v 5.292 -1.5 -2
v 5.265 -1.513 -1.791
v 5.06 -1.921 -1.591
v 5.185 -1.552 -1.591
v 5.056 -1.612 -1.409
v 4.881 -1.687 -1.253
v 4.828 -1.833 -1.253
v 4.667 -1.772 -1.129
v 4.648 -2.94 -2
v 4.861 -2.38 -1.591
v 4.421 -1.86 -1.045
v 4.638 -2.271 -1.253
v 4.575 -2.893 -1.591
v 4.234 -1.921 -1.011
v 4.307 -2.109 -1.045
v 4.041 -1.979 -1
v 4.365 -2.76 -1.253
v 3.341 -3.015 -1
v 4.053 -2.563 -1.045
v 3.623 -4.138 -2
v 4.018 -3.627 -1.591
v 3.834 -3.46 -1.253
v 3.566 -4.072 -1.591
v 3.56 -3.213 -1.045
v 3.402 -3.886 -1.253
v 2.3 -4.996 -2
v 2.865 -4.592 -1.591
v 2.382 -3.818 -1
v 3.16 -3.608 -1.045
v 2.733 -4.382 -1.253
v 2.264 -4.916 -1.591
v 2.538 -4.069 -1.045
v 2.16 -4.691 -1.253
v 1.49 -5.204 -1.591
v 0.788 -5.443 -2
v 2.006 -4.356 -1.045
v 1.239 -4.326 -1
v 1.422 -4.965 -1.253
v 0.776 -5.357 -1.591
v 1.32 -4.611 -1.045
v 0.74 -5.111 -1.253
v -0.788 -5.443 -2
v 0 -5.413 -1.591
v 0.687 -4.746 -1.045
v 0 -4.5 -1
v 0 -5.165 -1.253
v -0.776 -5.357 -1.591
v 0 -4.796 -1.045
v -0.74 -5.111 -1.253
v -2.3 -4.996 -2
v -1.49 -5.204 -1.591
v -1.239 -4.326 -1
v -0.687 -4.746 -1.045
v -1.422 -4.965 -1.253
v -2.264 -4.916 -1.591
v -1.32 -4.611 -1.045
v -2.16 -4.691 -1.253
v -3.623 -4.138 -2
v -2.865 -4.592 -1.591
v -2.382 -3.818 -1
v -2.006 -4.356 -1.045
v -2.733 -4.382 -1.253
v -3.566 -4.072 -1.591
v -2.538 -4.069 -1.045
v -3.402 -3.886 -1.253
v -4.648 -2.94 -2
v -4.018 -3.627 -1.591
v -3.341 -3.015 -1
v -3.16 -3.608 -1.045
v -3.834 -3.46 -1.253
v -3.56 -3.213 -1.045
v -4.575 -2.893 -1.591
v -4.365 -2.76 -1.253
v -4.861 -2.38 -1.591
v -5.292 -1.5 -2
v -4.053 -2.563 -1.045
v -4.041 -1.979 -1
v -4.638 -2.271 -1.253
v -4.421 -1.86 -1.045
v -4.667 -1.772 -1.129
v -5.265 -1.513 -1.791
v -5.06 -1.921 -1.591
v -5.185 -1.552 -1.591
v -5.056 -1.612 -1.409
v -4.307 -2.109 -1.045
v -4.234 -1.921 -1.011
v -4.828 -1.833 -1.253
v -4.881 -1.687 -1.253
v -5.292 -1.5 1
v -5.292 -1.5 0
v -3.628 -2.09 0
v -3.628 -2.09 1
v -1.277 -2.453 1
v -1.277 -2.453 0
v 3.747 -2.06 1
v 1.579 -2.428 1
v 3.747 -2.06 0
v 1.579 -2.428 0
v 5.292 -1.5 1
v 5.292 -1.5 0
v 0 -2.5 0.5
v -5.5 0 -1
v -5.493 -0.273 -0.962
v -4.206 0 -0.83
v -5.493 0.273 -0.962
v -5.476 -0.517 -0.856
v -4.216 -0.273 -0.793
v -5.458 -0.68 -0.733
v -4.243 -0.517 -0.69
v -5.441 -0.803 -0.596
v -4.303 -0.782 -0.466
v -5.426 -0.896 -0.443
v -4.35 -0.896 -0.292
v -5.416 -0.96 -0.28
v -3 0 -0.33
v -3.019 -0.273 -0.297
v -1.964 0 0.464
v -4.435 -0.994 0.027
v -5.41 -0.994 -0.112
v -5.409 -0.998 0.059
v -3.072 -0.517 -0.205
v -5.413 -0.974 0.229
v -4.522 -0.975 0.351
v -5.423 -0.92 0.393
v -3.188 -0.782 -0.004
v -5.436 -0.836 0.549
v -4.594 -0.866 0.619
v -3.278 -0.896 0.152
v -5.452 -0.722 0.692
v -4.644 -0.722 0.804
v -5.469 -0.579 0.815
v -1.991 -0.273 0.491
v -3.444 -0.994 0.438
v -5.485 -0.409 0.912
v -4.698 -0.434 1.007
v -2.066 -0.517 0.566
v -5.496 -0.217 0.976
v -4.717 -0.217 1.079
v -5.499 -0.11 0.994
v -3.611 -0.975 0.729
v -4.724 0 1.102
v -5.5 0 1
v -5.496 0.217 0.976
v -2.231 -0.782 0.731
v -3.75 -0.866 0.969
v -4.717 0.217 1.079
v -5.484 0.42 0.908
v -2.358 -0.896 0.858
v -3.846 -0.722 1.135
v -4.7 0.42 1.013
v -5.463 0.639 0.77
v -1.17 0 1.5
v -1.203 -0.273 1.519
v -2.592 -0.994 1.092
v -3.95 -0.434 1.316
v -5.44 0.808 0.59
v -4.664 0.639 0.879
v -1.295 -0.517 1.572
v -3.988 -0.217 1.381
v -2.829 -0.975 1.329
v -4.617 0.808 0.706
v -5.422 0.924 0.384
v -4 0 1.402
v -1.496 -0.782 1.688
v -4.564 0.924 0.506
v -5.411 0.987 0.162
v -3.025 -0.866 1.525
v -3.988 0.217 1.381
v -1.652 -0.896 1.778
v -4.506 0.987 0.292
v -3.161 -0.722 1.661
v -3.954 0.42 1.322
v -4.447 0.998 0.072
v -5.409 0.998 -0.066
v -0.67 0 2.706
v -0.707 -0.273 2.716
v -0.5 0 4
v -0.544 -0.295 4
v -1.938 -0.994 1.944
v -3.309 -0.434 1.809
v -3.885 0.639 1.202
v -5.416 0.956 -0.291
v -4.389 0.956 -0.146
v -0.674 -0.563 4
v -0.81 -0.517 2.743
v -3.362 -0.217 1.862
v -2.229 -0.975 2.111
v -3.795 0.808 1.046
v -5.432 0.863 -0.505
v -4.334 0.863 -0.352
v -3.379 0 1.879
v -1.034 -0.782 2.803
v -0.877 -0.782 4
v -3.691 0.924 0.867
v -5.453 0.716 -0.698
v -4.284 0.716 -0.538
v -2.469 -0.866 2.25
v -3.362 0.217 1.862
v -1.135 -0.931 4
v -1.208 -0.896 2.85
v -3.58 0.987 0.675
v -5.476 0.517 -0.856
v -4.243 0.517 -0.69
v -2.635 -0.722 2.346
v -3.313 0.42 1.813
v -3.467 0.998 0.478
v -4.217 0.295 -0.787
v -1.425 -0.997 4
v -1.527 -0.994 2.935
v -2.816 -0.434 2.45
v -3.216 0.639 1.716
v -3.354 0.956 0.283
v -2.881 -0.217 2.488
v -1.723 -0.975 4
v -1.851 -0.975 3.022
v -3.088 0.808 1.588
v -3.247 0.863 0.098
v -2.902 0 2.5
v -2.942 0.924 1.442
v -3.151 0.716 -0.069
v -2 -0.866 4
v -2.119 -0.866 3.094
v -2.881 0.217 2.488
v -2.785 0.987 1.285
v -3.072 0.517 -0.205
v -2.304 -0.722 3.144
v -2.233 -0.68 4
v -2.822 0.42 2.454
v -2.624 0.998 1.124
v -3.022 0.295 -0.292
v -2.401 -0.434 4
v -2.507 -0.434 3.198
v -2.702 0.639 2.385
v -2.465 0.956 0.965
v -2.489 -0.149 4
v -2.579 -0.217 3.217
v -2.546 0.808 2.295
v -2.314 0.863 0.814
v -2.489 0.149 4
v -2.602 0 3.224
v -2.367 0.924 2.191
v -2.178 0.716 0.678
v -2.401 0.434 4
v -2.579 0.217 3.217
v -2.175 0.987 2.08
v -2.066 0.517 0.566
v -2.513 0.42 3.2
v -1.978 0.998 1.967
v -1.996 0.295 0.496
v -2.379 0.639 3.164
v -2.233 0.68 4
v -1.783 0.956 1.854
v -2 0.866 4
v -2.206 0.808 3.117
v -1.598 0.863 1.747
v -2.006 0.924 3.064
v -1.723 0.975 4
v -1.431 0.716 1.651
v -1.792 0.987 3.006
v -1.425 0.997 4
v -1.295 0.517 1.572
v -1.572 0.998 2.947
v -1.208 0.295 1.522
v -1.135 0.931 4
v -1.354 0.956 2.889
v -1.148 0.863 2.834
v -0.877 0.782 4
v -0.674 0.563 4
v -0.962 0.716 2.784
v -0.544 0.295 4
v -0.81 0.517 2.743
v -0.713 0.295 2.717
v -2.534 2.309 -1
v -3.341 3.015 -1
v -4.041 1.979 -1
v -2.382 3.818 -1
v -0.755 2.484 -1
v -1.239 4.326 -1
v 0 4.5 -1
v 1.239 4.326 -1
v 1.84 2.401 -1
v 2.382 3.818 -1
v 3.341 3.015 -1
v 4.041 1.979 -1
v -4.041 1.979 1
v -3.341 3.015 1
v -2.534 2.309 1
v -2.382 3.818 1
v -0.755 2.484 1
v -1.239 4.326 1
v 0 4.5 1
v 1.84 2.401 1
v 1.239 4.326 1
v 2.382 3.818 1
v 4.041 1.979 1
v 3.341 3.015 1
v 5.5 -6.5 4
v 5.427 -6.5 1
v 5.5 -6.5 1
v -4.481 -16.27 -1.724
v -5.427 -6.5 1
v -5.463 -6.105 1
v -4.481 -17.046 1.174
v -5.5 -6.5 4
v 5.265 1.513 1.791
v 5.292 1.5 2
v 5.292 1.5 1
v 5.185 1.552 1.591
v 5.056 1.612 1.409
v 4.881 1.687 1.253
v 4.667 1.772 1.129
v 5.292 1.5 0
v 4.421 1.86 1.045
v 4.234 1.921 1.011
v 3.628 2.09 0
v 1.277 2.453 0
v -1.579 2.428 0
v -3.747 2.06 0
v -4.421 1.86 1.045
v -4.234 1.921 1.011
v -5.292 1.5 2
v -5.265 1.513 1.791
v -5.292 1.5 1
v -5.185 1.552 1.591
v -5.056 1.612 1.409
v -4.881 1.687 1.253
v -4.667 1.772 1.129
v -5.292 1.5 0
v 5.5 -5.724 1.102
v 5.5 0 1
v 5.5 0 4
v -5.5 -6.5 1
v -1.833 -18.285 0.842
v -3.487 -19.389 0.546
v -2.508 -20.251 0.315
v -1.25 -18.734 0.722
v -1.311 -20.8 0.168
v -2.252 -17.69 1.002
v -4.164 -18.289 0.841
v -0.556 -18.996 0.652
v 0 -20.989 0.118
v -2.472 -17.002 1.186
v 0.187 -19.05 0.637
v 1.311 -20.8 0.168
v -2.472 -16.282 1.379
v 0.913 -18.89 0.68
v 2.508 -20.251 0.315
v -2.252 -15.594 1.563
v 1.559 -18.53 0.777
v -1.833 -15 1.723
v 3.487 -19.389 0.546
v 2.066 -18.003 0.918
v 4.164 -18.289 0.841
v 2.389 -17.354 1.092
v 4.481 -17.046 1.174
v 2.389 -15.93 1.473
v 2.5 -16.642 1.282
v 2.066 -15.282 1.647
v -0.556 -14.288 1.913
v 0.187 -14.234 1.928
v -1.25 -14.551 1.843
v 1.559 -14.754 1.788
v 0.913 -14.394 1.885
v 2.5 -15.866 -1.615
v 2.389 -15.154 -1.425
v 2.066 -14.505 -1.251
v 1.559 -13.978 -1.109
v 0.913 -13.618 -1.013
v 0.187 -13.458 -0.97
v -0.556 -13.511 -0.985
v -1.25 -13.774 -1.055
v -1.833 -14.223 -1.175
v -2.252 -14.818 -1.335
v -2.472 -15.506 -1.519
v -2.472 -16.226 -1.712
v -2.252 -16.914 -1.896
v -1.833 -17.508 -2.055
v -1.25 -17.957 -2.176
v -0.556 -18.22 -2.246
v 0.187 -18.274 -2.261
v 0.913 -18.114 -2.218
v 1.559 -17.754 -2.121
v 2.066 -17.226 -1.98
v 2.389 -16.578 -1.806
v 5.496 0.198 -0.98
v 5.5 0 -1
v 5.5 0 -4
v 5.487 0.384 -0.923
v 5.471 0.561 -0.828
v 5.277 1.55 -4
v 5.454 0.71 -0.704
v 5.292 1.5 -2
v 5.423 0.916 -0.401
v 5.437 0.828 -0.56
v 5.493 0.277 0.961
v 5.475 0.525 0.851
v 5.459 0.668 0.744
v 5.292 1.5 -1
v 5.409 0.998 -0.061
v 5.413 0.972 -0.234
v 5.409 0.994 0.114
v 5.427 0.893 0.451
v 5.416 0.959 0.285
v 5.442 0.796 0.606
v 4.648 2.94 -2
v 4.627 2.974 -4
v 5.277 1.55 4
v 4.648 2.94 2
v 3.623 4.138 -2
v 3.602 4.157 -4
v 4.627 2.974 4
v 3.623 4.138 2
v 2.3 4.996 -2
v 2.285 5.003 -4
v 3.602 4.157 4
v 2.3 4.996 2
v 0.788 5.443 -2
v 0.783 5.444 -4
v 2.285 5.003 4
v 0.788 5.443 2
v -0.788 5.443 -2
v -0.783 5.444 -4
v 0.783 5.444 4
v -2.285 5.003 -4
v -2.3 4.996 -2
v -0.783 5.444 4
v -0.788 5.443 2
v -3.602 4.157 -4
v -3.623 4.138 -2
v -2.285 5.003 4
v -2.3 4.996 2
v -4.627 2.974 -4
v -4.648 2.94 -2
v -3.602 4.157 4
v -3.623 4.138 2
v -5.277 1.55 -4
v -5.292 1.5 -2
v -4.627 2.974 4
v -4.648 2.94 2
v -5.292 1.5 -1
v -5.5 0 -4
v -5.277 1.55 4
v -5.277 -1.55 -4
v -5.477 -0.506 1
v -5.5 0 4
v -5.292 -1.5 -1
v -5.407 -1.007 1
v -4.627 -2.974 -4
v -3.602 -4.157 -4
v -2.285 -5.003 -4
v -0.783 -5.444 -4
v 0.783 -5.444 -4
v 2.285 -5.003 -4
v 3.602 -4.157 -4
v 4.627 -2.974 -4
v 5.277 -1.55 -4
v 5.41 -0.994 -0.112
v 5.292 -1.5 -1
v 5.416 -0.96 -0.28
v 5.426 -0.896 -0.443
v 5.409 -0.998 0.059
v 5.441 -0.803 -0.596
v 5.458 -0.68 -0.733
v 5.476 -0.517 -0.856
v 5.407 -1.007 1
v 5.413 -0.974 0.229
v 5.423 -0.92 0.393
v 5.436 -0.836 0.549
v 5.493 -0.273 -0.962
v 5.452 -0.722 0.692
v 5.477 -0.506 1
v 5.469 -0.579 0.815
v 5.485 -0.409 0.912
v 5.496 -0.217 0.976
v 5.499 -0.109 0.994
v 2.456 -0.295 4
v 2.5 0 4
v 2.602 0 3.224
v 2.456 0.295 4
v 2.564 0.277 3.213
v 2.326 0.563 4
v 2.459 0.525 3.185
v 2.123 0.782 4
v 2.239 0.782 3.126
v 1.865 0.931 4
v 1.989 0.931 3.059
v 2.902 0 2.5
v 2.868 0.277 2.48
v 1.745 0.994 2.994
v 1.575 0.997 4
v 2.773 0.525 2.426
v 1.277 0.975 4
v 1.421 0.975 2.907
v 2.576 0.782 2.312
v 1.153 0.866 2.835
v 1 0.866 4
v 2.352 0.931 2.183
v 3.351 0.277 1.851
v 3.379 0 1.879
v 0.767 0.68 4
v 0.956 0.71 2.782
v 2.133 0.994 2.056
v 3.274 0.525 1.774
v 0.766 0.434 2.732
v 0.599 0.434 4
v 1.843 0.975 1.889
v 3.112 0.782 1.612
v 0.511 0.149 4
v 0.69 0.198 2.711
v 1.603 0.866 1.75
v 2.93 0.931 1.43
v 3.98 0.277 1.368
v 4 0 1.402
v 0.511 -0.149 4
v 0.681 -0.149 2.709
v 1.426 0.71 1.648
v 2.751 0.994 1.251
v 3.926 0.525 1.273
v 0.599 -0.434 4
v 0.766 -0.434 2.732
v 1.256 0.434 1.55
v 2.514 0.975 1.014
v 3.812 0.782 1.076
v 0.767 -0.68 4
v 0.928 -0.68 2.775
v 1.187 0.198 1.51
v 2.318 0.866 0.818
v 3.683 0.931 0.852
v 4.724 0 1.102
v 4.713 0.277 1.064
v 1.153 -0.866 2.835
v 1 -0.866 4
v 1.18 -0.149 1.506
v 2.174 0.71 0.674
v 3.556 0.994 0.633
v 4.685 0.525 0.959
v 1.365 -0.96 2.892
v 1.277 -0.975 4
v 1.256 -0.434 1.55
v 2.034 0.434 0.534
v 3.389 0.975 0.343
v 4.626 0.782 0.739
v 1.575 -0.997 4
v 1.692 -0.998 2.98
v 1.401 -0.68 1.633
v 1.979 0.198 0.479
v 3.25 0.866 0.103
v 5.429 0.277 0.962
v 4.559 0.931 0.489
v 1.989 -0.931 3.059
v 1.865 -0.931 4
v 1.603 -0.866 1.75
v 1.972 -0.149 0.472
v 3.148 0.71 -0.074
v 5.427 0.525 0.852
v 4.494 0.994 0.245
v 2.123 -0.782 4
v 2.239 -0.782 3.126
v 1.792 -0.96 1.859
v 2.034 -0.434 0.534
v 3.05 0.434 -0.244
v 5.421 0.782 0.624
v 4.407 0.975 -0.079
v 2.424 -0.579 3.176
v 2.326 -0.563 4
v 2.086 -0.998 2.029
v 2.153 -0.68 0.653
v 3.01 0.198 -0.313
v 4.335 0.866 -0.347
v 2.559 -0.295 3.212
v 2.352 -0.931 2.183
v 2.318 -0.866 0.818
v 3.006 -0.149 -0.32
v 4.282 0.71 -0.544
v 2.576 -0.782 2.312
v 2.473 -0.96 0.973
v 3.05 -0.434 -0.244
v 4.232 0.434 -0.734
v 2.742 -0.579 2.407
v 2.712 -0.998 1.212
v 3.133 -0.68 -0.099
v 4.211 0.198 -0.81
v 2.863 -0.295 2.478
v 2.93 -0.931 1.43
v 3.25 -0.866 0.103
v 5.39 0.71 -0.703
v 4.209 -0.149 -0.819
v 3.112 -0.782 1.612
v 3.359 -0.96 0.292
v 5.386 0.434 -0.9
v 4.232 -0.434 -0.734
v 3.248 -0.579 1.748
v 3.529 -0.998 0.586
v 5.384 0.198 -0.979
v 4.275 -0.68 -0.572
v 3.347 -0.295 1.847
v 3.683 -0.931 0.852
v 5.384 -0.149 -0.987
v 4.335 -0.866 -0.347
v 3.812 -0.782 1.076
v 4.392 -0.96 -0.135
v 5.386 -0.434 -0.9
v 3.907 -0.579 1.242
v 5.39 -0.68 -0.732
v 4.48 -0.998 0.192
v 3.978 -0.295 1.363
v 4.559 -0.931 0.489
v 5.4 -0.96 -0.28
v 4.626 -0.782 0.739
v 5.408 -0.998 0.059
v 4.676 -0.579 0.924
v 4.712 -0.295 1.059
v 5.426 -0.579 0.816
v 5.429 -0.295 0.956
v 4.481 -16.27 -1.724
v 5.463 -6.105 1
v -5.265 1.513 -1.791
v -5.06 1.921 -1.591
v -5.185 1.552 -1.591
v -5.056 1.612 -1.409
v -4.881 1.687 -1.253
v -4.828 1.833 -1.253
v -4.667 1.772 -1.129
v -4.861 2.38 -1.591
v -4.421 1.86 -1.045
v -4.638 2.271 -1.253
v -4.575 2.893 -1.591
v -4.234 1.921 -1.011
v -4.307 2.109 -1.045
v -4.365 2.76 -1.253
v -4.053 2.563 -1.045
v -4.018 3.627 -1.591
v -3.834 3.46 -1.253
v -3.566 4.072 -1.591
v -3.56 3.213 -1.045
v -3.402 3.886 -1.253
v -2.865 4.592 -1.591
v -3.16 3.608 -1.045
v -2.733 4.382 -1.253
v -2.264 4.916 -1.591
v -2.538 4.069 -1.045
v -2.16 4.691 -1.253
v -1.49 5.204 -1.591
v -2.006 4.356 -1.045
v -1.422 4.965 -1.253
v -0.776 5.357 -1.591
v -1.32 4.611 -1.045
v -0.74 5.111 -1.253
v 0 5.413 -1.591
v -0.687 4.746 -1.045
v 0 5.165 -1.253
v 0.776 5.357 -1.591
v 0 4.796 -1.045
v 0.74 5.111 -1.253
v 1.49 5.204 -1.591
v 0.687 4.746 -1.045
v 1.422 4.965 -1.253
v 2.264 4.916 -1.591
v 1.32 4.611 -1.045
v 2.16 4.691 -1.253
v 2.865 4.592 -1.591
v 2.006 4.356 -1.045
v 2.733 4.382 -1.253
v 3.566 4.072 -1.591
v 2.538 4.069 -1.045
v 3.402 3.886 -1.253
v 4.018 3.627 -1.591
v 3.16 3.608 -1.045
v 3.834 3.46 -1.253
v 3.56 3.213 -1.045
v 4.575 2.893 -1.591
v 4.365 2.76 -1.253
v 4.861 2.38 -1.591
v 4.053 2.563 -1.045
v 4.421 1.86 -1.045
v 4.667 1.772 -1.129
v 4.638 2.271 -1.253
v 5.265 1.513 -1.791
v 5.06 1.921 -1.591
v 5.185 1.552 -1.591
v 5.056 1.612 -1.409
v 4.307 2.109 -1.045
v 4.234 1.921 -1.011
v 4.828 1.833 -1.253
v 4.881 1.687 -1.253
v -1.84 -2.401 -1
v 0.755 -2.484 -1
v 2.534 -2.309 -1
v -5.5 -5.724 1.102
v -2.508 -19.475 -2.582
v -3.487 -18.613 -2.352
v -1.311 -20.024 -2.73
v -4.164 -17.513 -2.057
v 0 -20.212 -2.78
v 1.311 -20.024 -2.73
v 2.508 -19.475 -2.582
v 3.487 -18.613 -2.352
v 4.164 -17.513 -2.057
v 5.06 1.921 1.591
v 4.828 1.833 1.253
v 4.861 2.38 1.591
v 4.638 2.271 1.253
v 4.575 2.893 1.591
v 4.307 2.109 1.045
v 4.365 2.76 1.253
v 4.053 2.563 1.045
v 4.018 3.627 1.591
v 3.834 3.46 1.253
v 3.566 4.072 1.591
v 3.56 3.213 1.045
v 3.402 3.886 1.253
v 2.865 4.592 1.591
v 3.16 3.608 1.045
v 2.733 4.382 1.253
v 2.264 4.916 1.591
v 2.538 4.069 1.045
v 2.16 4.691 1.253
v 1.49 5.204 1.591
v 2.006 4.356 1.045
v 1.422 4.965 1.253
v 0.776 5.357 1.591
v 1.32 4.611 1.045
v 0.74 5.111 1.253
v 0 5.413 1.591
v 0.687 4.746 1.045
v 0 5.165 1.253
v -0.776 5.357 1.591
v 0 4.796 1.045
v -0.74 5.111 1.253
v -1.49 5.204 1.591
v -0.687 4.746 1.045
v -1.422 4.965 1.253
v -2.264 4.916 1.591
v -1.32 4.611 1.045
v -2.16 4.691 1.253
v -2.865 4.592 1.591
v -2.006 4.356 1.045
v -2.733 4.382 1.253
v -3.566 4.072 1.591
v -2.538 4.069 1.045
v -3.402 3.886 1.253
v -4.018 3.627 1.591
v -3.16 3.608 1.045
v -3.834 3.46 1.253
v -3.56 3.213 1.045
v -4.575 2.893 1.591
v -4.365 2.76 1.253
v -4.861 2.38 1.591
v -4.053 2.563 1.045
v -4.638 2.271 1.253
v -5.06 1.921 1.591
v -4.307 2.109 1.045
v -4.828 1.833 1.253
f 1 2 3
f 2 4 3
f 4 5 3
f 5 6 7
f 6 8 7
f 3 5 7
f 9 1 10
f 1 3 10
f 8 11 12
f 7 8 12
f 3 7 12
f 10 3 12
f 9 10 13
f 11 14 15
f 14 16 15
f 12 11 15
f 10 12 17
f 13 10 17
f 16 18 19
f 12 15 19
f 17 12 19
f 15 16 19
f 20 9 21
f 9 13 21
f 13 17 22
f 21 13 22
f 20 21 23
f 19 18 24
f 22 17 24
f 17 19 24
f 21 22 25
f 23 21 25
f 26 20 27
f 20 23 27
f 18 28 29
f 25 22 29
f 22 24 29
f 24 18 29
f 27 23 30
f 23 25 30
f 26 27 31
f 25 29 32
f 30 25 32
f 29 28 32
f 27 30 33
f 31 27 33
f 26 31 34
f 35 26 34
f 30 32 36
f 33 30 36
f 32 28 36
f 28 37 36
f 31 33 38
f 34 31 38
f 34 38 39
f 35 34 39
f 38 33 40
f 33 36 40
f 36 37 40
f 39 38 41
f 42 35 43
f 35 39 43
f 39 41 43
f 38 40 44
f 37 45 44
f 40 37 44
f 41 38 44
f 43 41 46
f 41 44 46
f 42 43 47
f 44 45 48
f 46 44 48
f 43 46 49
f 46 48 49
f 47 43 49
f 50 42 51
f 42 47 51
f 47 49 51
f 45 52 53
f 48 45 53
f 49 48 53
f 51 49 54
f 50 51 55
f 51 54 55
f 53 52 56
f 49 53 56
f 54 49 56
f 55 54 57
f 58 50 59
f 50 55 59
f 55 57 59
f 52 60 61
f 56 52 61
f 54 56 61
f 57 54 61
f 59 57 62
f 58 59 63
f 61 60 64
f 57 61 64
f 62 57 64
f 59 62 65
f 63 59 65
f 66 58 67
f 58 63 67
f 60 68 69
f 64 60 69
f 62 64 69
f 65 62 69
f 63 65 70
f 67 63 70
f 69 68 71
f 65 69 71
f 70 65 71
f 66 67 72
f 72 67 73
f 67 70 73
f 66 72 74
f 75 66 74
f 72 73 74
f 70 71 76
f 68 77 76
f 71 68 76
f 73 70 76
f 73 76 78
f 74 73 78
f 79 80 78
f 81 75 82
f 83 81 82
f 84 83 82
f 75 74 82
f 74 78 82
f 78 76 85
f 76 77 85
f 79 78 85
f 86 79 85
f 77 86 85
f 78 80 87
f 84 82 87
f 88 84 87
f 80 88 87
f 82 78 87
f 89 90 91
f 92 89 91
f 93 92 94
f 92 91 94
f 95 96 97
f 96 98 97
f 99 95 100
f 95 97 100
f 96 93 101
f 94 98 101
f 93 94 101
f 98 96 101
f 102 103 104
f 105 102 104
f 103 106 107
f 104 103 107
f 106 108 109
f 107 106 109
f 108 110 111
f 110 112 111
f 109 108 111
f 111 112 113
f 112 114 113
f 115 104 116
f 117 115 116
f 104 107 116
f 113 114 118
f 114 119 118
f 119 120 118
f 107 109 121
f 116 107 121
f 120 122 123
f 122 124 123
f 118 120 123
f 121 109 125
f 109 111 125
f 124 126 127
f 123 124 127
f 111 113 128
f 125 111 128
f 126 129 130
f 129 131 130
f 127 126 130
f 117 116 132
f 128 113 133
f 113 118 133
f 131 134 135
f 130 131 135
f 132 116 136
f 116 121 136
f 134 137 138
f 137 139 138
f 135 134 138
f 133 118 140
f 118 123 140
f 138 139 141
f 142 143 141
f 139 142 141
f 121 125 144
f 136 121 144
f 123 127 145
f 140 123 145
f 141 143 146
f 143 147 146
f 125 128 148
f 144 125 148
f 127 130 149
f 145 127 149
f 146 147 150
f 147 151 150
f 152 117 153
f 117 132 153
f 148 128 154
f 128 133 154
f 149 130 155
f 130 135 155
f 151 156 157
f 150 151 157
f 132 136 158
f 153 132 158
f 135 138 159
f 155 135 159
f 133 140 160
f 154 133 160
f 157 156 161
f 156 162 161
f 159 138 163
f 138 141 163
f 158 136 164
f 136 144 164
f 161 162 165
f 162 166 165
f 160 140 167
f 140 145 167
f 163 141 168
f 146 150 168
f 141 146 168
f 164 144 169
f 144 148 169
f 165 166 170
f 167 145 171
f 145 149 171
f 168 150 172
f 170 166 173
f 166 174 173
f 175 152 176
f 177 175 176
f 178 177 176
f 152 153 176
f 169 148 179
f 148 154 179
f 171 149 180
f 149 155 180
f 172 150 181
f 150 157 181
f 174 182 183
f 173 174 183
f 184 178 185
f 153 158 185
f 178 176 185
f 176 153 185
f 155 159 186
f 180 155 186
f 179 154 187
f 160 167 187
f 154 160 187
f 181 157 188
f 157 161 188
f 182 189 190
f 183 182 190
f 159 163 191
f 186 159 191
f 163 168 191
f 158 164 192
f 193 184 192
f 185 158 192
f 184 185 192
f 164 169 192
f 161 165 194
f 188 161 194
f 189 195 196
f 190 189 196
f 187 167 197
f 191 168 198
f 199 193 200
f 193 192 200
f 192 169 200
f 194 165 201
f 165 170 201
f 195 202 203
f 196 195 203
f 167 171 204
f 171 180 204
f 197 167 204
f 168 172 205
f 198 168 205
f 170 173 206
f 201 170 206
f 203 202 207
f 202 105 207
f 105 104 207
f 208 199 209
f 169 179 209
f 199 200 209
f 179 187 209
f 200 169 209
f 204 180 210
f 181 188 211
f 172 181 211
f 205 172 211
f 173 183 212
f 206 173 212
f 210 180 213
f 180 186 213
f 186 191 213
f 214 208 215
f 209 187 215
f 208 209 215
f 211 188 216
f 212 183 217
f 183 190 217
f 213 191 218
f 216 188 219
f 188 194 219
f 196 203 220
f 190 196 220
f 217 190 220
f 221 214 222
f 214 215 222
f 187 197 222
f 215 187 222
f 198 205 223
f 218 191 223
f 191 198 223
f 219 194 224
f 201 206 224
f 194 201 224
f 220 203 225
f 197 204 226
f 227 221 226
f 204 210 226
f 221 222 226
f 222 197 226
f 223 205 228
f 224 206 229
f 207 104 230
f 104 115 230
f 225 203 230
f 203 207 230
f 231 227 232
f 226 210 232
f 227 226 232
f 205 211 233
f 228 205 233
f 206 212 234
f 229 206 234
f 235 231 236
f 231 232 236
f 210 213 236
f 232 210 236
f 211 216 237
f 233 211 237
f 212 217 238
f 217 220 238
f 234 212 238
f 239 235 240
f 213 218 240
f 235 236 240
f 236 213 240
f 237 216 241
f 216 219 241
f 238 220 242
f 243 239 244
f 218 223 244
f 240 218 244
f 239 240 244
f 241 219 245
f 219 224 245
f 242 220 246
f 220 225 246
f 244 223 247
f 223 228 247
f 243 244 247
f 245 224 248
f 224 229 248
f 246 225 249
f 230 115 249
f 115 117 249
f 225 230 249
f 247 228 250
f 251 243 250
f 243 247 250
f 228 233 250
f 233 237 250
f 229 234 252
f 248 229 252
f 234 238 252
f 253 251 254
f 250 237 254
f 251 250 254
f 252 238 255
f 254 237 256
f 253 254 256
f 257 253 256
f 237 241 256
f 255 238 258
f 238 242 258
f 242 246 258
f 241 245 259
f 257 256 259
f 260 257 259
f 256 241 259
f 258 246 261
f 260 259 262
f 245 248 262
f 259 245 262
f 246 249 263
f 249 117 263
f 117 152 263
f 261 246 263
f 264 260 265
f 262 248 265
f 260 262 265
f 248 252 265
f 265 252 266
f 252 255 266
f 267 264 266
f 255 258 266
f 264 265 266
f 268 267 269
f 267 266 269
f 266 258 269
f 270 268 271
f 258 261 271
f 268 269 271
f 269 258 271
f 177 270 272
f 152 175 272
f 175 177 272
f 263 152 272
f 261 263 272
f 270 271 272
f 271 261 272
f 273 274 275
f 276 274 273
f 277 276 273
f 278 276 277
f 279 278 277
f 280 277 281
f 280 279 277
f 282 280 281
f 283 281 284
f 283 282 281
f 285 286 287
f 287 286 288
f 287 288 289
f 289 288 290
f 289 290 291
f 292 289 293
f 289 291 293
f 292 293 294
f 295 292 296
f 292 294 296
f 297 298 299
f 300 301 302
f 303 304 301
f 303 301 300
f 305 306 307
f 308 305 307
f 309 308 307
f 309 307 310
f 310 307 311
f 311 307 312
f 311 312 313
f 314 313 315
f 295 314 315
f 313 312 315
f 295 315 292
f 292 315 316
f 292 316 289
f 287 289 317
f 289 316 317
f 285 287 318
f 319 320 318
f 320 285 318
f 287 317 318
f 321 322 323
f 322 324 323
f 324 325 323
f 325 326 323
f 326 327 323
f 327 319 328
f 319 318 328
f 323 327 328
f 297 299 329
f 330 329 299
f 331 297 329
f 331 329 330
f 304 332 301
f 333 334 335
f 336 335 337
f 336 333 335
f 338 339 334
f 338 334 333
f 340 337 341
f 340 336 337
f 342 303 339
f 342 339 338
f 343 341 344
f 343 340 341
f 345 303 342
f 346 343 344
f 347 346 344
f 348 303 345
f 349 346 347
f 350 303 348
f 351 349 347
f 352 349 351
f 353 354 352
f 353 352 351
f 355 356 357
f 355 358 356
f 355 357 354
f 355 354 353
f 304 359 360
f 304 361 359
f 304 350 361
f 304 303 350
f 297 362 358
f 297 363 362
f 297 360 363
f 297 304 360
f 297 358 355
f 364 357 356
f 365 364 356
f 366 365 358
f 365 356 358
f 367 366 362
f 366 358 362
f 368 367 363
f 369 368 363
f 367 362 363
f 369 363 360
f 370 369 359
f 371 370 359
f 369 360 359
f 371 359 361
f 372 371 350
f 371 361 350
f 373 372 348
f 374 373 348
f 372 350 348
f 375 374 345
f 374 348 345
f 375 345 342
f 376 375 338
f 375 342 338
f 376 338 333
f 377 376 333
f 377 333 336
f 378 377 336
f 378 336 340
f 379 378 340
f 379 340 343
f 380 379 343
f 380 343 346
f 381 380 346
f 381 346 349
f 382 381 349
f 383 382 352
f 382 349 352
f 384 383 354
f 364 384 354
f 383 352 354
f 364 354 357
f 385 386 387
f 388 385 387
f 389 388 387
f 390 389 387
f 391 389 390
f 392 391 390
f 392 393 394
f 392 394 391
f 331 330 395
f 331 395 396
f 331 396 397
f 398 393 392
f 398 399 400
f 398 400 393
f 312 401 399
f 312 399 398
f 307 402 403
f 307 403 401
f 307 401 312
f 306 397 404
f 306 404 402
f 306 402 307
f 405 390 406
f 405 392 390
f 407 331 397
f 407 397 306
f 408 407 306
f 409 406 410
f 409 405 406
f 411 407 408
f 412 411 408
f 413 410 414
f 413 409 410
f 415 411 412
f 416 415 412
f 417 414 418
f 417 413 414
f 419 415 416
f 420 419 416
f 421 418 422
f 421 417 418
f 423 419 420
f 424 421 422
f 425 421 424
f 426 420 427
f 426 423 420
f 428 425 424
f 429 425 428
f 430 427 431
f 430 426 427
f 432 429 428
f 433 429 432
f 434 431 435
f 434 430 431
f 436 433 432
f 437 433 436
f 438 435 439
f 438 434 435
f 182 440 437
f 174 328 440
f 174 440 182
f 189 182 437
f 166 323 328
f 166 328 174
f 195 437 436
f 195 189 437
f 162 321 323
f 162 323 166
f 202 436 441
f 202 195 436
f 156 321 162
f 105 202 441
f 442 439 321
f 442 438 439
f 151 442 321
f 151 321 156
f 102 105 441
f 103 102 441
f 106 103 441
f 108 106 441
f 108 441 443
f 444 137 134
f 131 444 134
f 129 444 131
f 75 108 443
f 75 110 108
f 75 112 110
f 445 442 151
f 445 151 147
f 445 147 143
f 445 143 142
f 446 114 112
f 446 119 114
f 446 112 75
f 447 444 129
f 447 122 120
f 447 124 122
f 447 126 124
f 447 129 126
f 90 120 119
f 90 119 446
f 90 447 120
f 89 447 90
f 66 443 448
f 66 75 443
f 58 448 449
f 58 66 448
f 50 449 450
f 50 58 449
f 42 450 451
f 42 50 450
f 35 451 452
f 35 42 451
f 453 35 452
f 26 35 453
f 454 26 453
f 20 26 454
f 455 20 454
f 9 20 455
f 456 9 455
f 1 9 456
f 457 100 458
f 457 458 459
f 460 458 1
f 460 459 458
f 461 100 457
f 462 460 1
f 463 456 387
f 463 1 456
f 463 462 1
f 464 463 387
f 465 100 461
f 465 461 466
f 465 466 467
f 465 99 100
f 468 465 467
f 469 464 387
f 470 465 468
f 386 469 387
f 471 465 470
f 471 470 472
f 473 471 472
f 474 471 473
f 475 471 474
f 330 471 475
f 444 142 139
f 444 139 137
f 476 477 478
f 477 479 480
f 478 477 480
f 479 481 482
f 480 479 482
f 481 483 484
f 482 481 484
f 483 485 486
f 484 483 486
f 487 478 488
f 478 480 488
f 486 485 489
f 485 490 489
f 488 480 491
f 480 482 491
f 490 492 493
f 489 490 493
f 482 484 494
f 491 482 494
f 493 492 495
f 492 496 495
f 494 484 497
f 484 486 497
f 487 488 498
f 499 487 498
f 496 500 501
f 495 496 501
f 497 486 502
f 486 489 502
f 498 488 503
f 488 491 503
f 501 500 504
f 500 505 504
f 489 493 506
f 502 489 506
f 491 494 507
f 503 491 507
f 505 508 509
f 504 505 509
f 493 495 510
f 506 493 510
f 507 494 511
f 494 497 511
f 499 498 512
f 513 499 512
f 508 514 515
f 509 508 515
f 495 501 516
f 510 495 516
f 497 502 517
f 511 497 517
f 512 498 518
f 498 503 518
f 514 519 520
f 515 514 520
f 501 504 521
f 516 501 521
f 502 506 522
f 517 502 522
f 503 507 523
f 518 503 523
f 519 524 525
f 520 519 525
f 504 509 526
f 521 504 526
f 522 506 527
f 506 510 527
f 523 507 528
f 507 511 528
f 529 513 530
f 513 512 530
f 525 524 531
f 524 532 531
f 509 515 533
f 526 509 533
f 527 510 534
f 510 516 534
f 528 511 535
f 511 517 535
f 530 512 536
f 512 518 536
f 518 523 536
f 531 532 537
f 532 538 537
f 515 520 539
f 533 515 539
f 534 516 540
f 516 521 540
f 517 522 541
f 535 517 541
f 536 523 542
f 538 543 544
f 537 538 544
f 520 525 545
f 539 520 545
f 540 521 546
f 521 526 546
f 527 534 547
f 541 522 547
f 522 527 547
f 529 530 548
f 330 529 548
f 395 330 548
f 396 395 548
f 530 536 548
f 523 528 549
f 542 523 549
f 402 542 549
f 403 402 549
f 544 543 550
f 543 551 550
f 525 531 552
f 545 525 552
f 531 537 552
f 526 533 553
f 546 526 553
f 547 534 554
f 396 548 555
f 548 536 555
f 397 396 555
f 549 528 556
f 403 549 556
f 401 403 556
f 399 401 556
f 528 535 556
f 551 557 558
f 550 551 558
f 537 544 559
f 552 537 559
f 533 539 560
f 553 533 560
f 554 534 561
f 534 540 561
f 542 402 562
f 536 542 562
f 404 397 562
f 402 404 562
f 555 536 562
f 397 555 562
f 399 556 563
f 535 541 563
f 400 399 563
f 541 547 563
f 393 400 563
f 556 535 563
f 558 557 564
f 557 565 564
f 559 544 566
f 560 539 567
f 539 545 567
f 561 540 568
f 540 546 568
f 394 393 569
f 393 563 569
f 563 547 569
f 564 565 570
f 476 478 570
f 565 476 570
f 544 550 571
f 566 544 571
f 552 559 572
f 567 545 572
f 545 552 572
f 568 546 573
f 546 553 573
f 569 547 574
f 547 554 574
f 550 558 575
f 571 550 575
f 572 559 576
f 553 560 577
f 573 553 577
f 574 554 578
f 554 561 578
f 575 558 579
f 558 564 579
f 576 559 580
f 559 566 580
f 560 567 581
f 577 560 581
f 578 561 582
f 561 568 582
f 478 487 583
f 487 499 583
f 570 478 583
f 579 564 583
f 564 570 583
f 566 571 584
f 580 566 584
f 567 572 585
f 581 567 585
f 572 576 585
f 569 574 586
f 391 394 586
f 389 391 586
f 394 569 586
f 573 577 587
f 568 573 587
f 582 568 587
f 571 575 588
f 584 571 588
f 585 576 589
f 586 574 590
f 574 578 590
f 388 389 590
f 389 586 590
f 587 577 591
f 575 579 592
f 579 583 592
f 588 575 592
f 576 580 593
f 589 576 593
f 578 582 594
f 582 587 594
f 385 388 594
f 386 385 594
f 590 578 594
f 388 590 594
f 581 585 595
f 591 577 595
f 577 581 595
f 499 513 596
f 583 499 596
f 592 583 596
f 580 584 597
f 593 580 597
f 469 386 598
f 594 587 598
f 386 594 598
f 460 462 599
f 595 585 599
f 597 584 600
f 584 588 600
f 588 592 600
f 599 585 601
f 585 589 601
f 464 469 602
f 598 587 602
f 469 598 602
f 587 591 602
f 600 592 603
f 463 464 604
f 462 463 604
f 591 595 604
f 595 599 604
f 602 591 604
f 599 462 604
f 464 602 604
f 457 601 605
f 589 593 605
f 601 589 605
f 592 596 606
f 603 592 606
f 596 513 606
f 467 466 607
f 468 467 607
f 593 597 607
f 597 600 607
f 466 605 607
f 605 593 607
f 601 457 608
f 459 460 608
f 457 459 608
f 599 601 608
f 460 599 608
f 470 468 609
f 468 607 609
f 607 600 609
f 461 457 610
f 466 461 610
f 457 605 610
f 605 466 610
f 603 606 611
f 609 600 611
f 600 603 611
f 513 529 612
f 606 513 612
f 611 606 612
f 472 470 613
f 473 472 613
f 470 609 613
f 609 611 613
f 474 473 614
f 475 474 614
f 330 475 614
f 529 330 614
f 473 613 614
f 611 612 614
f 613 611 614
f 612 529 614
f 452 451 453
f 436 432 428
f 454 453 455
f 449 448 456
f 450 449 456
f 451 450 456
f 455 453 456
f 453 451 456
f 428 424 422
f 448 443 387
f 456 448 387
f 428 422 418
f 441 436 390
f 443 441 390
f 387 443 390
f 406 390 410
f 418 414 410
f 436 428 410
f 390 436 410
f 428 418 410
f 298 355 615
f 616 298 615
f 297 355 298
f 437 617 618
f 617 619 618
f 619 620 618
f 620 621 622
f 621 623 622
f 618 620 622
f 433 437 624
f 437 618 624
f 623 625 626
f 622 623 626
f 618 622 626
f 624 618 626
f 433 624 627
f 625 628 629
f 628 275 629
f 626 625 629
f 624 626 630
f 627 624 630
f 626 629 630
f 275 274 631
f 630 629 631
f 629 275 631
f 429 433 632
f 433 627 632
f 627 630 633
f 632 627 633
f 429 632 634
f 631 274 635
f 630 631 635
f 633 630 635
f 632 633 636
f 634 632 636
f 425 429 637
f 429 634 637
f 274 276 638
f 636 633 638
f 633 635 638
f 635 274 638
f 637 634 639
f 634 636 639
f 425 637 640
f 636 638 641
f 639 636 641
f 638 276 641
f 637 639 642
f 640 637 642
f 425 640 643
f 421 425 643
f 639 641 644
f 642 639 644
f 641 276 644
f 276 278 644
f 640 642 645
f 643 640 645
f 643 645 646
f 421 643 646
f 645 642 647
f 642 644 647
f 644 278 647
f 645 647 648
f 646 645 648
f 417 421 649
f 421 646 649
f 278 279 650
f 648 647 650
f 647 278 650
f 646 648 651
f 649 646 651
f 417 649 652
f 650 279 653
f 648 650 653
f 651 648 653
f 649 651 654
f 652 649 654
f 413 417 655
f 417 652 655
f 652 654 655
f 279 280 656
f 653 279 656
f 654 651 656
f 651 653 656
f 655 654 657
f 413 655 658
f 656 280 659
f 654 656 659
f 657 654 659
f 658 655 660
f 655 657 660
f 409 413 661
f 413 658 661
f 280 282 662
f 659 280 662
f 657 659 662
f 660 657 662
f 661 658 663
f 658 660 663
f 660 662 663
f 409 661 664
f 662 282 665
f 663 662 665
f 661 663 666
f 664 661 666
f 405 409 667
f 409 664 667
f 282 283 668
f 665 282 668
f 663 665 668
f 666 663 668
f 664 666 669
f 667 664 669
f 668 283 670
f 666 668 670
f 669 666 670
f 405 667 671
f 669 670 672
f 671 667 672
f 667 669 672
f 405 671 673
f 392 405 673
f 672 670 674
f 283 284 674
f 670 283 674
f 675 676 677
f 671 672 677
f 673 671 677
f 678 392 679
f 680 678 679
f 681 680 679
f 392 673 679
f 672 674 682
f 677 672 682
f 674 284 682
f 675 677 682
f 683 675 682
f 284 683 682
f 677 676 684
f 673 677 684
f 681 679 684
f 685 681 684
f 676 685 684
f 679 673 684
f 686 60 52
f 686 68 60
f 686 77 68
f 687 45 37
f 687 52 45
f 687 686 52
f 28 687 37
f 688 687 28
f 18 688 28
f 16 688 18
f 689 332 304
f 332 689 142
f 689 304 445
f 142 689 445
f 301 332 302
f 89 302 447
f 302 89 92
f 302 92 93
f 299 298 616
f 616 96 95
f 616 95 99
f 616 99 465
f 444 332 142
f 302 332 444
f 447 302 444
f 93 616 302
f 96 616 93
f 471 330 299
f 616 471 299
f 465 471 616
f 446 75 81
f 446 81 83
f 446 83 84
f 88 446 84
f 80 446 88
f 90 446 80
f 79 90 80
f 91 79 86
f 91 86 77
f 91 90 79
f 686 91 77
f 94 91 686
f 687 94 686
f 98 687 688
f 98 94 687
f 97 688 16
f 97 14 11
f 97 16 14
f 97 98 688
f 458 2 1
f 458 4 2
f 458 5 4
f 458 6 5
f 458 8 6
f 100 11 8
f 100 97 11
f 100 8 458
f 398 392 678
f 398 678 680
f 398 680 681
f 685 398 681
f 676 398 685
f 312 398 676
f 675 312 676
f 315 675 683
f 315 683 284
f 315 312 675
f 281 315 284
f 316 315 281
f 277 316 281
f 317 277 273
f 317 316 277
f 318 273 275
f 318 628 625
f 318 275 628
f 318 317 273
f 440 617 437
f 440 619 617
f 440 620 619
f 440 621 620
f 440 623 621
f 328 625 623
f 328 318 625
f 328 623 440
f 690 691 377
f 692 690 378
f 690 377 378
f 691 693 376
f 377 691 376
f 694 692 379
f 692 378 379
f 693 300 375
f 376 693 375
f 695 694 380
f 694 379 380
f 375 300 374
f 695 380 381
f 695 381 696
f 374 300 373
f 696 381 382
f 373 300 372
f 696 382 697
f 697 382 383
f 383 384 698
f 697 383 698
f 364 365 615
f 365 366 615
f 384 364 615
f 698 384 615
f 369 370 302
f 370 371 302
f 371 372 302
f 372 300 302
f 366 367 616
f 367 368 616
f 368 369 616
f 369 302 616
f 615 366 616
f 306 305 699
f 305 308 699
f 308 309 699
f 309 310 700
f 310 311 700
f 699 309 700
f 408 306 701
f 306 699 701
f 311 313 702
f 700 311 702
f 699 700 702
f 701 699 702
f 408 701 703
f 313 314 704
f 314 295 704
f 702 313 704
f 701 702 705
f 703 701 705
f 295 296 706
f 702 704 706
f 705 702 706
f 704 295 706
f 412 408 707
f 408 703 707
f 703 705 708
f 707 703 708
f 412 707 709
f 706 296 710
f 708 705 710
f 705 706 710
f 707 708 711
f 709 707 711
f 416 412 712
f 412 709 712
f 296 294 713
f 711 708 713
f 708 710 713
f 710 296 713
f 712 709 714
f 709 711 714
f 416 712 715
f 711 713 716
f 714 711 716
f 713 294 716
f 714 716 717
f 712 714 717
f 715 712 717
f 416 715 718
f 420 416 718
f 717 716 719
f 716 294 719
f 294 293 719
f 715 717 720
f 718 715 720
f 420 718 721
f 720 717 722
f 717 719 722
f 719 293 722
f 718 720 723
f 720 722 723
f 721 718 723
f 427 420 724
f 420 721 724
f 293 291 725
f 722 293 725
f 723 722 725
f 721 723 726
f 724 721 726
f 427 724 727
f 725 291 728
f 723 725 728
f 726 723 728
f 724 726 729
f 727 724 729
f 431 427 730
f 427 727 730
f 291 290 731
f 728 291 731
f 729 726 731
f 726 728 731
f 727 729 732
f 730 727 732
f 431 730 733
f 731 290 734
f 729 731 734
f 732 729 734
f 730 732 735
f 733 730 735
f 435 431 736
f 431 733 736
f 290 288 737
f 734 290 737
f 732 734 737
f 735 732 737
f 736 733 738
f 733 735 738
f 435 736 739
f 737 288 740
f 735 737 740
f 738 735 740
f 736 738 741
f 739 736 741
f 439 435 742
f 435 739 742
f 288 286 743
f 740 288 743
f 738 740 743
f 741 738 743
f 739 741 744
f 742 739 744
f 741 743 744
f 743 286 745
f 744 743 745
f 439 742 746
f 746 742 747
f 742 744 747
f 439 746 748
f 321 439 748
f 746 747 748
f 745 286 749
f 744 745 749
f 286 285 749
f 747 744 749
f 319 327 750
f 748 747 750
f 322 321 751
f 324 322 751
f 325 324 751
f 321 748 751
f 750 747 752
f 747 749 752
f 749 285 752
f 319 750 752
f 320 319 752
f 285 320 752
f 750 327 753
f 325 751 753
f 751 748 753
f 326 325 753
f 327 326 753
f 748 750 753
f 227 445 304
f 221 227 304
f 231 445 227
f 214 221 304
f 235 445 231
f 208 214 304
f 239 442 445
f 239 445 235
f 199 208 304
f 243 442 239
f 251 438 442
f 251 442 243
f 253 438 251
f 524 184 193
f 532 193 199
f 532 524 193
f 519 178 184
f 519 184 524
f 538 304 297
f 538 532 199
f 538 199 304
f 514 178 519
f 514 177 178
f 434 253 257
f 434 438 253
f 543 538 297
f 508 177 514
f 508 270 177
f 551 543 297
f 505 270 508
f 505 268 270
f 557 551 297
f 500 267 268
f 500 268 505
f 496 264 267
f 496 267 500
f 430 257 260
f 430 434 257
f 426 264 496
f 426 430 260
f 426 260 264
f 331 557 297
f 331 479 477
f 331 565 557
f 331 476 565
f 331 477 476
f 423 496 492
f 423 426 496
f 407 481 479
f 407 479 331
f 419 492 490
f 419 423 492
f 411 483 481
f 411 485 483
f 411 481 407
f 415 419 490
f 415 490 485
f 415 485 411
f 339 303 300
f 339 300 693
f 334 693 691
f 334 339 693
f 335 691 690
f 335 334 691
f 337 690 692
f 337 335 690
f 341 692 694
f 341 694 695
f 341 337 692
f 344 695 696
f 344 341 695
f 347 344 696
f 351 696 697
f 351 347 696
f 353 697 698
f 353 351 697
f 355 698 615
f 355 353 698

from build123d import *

# Parameters (mm, degrees)
SKETCH_R            = 5.5
PAD_DEPTH           = 4
POCKET_DEPTH        = 1
SKETCH006_W         = 11
SKETCH006_H         = 6.5
PAD001_DEPTH        = 3
PAD002_DEPTH        = 3
SKETCH004_R         = 1
MIRROREDSKETCH003_R = 1
SKETCH008_R         = 2.5
POCKET001_DEPTH     = 3
FILLET_R            = 1


with BuildPart() as part:
    # Sketch → Pad (new body, symmetric)
    with BuildSketch(Plane.XY):
        Circle(SKETCH_R)
    extrude(amount=PAD_DEPTH, both=True)

    # Sketch002 → Pocket (cut, symmetric)
    with BuildSketch(Plane.XY):
        with BuildLine():
            ThreePointArc((-5.291503, -1.5), (0, -5.5), (5.291503, -1.5))
            add(Edge.make_bspline(
                [(-5.291503, -1.5), (0, -4.166667), (5.291503, -1.5)],
                knots=[3.785094, 3.785094, 3.785094, 5.639684, 5.639684, 5.639684], degree=2, weights=[1, 0.6, 1]))
        make_face()
        with BuildLine():
            ThreePointArc((5.291503, 1.5), (0, 5.5), (-5.291503, 1.5))
            add(Edge.make_bspline(
                [(5.291503, 1.5), (0, 4.166667), (-5.291503, 1.5)],
                knots=[0.643501, 0.643501, 0.643501, 2.498092, 2.498092, 2.498092], degree=2, weights=[1, 0.6, 1]))
        make_face()
    extrude(amount=POCKET_DEPTH, both=True, mode=Mode.SUBTRACT)

    # Sketch006 (on DatumPlane) → Pad001 (join)
    with BuildSketch(Plane.XY.offset(4)):
        with Locations((0, -3.25)):
            Rectangle(SKETCH006_W, SKETCH006_H)
    extrude(amount=-PAD001_DEPTH)

    # Sketch007 (on DatumPlane) → Pad002 (join)
    with BuildSketch(Plane(origin=(0, -6.5, 4), x_dir=(1, 0, 0), z_dir=(0, -0.258819, 0.965926))):
        with BuildLine():
            Line((-5.5, 0), (-4.48051, -10.918363))
            ThreePointArc((-4.48051, -10.918363), (0, -15), (4.48051, -10.918363))
            Line((4.48051, -10.918363), (5.5, 0))
            Line((5.5, 0), (-5.5, 0))
        make_face()
    extrude(amount=-PAD002_DEPTH)

    # SubtractivePipe: sweep along a path in MirroredSketch002
    with BuildLine(Plane.XZ) as subtractivepipe_path:
        ThreePointArc((-5.5, 0), (-2.671573, 1.171573), (-1.5, 4))
    # Sketch004 (on DatumPlane) → SubtractivePipe (sweep, cut)
    with BuildSketch(Plane.XY.offset(4)):
        with Locations((-1.5, 0)):
            Circle(SKETCH004_R)
    sweep(path=subtractivepipe_path.line, mode=Mode.SUBTRACT)

    # SubtractivePipe001: sweep along a path in Sketch003
    with BuildLine(Plane.XZ) as subtractivepipe001_path:
        ThreePointArc((1.5, 4), (2.671573, 1.171573), (5.5, 0))
    # MirroredSketch003 → SubtractivePipe001 (sweep, cut)
    with BuildSketch(Plane.XY.offset(4)):
        with Locations((1.5, 0)):
            Circle(MIRROREDSKETCH003_R)
    sweep(path=subtractivepipe001_path.line, mode=Mode.SUBTRACT)

    # Sketch008 (on DatumPlane) → Pocket001 (cut)
    with BuildSketch(Plane(origin=(0, -6.5, 4), x_dir=(1, 0, 0), z_dir=(0, -0.258819, 0.965926))):
        with Locations((0, -10.5)):
            Circle(SKETCH008_R)
    extrude(amount=-POCKET001_DEPTH, mode=Mode.SUBTRACT)

    # Fillet
    fillet_edges = [part.edges().sort_by_distance(p)[0] for p in [
        (0, 5.5, -1),
        (0, 5.5, 1),
        (0, -5.5, -1),
    ]]
    fillet(fillet_edges, radius=FILLET_R)


solid = part.part
